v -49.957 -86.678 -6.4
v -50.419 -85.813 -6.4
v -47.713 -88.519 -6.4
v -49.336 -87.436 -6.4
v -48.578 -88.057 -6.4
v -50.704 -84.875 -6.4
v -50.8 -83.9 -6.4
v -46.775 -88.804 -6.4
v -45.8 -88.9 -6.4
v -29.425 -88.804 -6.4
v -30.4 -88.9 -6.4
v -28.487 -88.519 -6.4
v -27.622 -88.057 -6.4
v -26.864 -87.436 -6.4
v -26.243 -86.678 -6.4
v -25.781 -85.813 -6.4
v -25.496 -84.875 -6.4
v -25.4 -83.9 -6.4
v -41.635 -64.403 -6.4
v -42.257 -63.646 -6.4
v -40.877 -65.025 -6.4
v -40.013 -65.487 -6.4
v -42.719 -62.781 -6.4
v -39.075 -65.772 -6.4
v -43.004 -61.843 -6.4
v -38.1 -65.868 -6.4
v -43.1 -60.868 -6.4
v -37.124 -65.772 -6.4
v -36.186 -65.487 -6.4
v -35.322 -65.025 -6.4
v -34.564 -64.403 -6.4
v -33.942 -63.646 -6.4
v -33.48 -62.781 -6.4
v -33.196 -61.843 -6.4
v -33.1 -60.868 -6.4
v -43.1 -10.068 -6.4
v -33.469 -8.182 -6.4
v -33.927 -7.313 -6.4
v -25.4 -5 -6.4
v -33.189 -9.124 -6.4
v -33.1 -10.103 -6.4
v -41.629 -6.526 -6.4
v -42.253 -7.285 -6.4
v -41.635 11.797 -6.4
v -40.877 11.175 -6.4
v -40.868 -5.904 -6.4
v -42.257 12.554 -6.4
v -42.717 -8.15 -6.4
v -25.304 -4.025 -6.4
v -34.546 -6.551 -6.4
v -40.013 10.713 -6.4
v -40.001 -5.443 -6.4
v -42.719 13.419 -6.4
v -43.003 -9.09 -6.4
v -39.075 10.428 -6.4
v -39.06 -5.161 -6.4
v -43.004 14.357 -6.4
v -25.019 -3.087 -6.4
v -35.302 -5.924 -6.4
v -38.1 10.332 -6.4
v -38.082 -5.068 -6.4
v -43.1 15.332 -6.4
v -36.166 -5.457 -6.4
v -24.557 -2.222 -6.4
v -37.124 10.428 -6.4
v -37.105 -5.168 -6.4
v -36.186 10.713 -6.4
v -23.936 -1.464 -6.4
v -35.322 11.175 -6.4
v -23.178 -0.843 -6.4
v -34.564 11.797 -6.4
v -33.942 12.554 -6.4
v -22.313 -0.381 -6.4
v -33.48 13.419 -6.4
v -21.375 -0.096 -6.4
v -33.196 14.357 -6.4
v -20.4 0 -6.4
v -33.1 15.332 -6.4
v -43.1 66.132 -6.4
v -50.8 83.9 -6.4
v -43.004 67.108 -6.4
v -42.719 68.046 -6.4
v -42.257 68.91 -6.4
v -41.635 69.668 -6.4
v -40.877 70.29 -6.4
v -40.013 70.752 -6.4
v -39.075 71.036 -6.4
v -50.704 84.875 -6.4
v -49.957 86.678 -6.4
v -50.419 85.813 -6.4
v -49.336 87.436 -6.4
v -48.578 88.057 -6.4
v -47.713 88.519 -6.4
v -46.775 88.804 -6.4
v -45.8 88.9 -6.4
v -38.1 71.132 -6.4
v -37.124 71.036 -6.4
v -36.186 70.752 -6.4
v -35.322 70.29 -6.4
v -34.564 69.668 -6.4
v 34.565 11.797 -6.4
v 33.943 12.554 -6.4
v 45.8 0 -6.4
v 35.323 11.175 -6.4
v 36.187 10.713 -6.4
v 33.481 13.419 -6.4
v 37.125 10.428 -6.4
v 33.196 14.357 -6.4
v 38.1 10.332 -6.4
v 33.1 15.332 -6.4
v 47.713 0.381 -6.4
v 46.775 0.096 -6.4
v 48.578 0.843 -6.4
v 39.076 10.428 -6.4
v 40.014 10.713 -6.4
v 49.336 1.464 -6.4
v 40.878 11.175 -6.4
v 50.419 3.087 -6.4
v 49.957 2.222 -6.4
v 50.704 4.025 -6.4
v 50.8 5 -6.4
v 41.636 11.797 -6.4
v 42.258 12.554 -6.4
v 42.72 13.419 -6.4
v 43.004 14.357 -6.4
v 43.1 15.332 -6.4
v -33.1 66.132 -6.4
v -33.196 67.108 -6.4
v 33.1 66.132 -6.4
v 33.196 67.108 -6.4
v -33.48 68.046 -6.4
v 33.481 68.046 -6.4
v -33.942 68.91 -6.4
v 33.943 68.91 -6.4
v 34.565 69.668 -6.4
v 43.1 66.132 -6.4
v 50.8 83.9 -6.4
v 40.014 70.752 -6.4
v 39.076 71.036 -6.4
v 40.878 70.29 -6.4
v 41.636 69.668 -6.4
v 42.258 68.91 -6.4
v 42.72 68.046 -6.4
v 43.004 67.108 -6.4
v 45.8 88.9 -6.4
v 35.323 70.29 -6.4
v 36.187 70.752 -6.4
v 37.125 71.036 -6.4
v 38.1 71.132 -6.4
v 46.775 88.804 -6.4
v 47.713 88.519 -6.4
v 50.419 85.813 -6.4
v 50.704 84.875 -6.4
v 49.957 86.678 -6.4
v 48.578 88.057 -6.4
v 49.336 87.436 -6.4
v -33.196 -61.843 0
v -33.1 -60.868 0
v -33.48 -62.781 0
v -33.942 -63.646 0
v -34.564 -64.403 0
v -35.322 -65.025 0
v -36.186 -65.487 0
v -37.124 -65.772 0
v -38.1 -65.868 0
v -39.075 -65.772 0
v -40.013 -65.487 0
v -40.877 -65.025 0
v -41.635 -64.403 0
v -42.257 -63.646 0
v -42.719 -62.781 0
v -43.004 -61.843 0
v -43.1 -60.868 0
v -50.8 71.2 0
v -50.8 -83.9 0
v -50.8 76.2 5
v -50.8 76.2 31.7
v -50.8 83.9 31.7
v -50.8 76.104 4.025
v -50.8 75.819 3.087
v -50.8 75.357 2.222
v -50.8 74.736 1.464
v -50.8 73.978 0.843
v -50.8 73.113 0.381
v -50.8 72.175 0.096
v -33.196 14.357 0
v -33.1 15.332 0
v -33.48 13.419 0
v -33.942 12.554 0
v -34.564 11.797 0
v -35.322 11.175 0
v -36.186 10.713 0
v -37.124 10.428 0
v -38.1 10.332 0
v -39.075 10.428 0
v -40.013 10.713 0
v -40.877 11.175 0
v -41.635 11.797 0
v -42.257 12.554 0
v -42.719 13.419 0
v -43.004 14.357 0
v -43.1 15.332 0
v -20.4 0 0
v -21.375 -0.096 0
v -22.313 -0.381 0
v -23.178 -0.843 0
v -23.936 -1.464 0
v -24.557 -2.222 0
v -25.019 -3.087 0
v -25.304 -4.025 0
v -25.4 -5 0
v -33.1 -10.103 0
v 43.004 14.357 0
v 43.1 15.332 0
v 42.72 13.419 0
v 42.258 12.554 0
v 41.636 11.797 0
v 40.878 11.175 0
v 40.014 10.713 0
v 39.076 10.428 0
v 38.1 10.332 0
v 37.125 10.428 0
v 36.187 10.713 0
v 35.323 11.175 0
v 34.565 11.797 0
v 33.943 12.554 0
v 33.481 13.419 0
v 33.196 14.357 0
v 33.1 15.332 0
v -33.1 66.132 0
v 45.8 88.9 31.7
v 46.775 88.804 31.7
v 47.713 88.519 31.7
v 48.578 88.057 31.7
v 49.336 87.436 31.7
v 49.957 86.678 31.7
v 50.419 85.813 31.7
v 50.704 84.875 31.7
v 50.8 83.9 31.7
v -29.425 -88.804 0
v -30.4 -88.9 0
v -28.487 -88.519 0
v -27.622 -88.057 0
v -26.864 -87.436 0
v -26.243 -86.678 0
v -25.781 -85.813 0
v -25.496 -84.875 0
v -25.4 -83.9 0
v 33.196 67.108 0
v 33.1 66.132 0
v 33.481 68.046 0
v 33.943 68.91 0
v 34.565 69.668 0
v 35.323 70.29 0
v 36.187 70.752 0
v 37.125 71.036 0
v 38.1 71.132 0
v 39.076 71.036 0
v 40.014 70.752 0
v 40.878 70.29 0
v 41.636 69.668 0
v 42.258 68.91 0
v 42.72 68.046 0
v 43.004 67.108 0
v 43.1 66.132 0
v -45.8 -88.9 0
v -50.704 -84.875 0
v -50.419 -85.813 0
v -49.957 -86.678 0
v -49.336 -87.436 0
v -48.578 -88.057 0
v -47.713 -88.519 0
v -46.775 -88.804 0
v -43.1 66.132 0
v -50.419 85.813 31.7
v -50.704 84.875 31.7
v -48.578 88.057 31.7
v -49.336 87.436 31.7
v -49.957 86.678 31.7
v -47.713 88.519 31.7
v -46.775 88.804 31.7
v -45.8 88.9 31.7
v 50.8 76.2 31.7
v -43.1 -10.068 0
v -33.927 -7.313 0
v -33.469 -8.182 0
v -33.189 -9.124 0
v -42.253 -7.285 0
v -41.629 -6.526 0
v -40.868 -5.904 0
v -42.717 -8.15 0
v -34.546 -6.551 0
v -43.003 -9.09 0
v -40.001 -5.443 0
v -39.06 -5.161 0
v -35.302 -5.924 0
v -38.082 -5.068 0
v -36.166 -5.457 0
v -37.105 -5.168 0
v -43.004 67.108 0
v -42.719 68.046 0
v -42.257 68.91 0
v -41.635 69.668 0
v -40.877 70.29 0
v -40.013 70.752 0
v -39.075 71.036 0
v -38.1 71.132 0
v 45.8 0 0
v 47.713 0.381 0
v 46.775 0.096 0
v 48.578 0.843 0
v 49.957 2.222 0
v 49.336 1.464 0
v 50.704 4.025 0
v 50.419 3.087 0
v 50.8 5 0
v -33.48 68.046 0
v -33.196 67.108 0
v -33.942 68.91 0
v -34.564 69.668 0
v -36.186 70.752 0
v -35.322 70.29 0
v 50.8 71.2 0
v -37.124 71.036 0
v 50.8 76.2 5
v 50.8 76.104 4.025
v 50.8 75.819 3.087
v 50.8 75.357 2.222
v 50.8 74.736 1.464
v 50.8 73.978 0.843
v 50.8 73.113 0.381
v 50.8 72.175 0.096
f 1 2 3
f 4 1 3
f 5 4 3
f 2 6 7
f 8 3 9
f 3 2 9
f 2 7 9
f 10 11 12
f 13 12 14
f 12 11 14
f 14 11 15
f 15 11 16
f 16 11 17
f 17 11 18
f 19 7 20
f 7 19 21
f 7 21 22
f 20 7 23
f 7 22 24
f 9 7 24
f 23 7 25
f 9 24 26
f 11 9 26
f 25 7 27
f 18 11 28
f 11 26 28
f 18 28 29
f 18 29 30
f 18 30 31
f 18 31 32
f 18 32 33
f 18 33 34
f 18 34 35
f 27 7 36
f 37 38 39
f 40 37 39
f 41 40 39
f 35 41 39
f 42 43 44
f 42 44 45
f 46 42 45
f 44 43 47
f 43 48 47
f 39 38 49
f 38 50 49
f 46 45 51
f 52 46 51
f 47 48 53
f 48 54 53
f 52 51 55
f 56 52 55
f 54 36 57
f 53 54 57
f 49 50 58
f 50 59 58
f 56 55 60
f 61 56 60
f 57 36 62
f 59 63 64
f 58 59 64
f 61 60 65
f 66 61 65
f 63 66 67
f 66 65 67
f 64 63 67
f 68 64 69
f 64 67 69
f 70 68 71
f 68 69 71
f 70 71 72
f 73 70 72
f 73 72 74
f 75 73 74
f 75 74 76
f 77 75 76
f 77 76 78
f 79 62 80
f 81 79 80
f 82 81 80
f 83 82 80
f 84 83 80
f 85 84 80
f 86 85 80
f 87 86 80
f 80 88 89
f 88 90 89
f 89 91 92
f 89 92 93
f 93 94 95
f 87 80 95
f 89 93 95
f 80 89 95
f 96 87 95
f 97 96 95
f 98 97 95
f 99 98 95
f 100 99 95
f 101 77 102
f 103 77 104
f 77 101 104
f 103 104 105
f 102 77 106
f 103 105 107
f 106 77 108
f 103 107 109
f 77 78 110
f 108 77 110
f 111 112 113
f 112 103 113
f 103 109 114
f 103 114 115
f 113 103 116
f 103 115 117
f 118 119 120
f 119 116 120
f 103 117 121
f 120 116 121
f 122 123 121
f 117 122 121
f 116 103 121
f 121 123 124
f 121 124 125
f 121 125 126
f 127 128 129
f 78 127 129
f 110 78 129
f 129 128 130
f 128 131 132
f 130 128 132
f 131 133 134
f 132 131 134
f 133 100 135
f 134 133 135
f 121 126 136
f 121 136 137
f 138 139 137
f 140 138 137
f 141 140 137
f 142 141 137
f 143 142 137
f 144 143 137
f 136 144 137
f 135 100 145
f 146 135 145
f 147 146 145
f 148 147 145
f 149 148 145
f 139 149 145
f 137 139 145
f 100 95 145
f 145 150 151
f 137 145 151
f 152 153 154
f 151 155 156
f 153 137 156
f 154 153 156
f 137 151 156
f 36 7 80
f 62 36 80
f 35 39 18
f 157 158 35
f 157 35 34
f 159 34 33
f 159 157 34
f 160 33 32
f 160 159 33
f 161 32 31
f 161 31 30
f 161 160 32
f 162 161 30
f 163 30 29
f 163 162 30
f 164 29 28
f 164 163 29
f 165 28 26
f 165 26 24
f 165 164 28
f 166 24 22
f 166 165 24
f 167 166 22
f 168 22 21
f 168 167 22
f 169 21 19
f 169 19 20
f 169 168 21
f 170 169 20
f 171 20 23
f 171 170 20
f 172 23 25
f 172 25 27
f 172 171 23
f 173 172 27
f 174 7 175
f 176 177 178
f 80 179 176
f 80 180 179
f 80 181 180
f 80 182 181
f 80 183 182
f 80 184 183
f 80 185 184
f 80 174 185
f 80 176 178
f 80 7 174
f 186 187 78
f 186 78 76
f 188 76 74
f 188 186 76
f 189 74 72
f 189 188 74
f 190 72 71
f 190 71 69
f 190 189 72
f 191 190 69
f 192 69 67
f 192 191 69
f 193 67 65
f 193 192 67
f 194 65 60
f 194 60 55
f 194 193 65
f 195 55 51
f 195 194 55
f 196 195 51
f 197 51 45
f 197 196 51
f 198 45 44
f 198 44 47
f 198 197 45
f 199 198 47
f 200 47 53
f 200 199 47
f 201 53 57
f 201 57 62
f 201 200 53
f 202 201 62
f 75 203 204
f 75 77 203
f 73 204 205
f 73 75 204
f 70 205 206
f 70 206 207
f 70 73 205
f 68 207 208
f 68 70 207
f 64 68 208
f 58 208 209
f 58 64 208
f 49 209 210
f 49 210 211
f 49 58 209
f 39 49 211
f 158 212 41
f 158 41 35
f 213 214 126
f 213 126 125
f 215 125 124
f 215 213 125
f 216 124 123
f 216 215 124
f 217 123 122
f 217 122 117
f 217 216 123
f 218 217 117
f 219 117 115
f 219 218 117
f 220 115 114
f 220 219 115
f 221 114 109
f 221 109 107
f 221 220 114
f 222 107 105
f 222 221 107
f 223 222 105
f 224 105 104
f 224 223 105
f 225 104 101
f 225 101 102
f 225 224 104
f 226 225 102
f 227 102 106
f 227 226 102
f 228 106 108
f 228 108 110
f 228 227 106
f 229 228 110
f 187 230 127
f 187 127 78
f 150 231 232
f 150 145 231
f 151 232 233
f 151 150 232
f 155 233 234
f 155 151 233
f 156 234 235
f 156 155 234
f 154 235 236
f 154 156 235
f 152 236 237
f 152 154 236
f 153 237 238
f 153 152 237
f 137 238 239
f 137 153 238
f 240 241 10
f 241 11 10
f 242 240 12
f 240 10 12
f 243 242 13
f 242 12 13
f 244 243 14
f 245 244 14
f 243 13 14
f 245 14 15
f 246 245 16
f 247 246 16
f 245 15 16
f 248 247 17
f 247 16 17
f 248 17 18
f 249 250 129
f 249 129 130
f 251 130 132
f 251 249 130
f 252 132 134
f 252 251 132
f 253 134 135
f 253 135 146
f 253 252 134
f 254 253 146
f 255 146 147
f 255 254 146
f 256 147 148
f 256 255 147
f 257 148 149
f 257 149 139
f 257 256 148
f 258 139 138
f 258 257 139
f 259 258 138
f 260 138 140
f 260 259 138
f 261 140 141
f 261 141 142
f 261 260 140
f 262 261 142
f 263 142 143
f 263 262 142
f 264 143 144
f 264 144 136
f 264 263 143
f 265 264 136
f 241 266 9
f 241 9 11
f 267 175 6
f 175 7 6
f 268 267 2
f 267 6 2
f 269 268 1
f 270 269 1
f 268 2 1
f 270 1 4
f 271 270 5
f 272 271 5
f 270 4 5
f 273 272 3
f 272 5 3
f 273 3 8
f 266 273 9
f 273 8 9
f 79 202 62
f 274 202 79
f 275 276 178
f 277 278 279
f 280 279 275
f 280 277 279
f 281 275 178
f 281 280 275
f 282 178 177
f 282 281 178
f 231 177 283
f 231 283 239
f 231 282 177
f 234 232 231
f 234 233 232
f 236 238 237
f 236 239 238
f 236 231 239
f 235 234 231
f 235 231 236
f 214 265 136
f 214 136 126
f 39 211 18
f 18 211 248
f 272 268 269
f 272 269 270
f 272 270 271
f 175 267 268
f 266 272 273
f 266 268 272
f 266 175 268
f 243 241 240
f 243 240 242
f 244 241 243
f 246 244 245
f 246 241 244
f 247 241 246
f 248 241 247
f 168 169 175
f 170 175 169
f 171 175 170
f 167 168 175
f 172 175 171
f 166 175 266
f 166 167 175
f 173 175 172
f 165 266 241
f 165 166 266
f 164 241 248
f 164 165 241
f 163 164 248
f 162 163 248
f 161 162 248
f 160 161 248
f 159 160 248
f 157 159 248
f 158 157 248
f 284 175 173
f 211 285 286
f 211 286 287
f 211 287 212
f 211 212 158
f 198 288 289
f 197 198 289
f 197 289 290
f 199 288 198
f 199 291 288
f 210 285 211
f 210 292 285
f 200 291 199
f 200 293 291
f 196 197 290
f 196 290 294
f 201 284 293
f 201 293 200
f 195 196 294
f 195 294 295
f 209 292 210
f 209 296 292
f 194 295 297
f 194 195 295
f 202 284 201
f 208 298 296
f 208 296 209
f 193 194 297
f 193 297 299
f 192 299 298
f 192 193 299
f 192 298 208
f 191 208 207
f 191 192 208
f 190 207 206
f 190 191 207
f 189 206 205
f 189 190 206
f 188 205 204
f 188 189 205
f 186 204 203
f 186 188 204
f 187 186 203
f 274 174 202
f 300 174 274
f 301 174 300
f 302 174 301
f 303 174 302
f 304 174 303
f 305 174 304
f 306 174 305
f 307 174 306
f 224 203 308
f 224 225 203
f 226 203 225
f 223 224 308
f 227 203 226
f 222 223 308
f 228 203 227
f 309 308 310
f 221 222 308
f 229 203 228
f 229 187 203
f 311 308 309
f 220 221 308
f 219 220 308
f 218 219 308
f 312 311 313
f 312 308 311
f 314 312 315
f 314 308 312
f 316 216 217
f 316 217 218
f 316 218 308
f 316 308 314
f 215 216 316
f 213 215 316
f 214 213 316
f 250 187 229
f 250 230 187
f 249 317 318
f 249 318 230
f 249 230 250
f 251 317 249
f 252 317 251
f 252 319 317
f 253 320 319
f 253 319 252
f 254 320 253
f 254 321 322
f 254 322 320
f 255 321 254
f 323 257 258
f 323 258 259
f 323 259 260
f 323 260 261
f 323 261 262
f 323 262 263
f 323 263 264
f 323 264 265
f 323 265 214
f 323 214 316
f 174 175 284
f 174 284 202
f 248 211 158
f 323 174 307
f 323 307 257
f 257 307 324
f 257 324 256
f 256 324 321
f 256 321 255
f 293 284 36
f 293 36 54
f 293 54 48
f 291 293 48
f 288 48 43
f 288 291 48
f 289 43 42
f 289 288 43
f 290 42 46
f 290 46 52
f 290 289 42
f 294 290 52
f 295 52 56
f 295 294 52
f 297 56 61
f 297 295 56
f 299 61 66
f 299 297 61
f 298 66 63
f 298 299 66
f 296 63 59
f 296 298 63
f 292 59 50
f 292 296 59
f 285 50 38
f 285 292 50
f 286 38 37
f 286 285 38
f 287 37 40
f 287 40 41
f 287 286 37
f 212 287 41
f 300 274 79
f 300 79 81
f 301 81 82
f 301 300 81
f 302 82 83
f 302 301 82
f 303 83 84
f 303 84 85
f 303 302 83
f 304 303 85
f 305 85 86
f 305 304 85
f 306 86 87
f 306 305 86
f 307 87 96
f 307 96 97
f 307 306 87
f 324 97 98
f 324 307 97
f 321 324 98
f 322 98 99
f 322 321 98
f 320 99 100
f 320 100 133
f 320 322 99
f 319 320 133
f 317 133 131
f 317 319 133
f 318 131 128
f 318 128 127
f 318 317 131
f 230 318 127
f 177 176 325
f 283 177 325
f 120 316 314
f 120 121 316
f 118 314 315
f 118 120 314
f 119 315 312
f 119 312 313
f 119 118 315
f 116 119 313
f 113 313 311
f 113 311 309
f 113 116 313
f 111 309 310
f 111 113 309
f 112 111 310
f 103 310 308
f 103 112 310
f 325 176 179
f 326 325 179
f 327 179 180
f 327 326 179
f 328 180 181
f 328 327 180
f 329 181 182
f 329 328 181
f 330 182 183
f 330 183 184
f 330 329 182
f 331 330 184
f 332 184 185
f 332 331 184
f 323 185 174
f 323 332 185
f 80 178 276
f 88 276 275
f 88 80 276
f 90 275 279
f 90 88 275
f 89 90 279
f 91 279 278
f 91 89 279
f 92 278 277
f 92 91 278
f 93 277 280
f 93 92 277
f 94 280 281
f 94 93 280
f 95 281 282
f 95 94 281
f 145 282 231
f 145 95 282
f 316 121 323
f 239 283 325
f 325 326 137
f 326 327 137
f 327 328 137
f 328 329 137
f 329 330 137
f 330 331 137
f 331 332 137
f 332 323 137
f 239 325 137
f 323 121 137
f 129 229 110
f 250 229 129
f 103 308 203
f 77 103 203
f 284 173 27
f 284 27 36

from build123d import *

# Parameters (mm, degrees)
F0_W     = 101.6
F0_H     = 12.7
F1_DEPTH = 6.4
F2_DEPTH = 31.7
F3_DEPTH = 6.4
F4_R     = 5


with BuildPart() as f1:
    # F0 (on Top) → F1 (new body)
    with BuildSketch(Plane.XY):
        Polygon((-25.4, -88.9), (50.8, -88.9), (50.8, -10.749764), (50.8, 0), (-25.4, 0), align=None)
        with BuildLine():
            ThreePointArc((33.332847, -10.749764), (38.332847, -5.749764), (43.332847, -10.749764))
            Line((43.332847, -10.749764), (43.332847, -61.549764))
            ThreePointArc((43.332847, -61.549764), (38.332847, -66.549764), (33.332847, -61.549764))
            Line((33.332847, -61.549764), (33.332847, -10.749764))
        make_face(mode=Mode.SUBTRACT)
        Polygon((-50.8, -88.9), (-25.4, -88.9), (-25.4, 0), (50.8, 0), (50.8, 76.2), (-50.8, 76.2), (-50.8, -10.067825), align=None)
        with BuildLine():
            Line((-43.099635, -60.867813), (-43.099635, -10.067825))
            ThreePointArc((-43.099635, -10.067825), (-38.08229, -5.067855), (-33.099755, -10.102513))
            Line((-33.099755, -10.102513), (-33.099635, -60.867813))
            ThreePointArc((-33.099635, -60.867813), (-38.099635, -65.867813), (-43.099635, -60.867813))
        make_face(mode=Mode.SUBTRACT)
        with BuildLine():
            Line((-33.099635, 66.132175), (-33.099635, 15.332175))
            ThreePointArc((-33.099635, 15.332175), (-38.099635, 10.332175), (-43.099635, 15.332175))
            Line((-43.099635, 15.332175), (-43.099635, 66.132175))
            ThreePointArc((-43.099635, 66.132175), (-38.099635, 71.132175), (-33.099635, 66.132175))
        make_face(mode=Mode.SUBTRACT)
        with BuildLine():
            Line((43.100365, 66.132175), (43.100365, 15.332175))
            ThreePointArc((43.100365, 15.332175), (38.100365, 10.332175), (33.100365, 15.332175))
            Line((33.100365, 15.332175), (33.100365, 66.132175))
            ThreePointArc((33.100365, 66.132175), (38.100365, 71.132175), (43.100365, 66.132175))
        make_face(mode=Mode.SUBTRACT)
        with Locations((0, 82.55)):
            Rectangle(F0_W, F0_H)
    extrude(amount=-F1_DEPTH)

    # F0 (on Top) → F2 (join)
    with BuildSketch(Plane.XY):
        with Locations((0, 82.55)):
            Rectangle(F0_W, F0_H)
    extrude(amount=F2_DEPTH)

    # F0 (on Top) → F3 (cut)
    with BuildSketch(Plane.XY):
        Polygon((-25.4, -88.9), (50.8, -88.9), (50.8, -10.749764), (50.8, 0), (-25.4, 0), align=None)
        with BuildLine():
            ThreePointArc((33.332847, -10.749764), (38.332847, -5.749764), (43.332847, -10.749764))
            Line((43.332847, -10.749764), (43.332847, -61.549764))
            ThreePointArc((43.332847, -61.549764), (38.332847, -66.549764), (33.332847, -61.549764))
            Line((33.332847, -61.549764), (33.332847, -10.749764))
        make_face(mode=Mode.SUBTRACT)
    extrude(amount=-F3_DEPTH, mode=Mode.SUBTRACT)

    # F4
    f4_edges = [f1.edges().sort_by_distance(p)[0] for p in [
        (0, 76.2, 0),
        (50.8, 88.9, 12.65),
        (-50.8, 88.9, 12.65),
        (50.8, 0, -3.2),
        (-25.4, 0, -3.2),
        (-25.4, -88.9, -3.2),
        (-50.8, -88.9, -3.2),
    ]]
    fillet(f4_edges, radius=F4_R)


solid = f1.part
